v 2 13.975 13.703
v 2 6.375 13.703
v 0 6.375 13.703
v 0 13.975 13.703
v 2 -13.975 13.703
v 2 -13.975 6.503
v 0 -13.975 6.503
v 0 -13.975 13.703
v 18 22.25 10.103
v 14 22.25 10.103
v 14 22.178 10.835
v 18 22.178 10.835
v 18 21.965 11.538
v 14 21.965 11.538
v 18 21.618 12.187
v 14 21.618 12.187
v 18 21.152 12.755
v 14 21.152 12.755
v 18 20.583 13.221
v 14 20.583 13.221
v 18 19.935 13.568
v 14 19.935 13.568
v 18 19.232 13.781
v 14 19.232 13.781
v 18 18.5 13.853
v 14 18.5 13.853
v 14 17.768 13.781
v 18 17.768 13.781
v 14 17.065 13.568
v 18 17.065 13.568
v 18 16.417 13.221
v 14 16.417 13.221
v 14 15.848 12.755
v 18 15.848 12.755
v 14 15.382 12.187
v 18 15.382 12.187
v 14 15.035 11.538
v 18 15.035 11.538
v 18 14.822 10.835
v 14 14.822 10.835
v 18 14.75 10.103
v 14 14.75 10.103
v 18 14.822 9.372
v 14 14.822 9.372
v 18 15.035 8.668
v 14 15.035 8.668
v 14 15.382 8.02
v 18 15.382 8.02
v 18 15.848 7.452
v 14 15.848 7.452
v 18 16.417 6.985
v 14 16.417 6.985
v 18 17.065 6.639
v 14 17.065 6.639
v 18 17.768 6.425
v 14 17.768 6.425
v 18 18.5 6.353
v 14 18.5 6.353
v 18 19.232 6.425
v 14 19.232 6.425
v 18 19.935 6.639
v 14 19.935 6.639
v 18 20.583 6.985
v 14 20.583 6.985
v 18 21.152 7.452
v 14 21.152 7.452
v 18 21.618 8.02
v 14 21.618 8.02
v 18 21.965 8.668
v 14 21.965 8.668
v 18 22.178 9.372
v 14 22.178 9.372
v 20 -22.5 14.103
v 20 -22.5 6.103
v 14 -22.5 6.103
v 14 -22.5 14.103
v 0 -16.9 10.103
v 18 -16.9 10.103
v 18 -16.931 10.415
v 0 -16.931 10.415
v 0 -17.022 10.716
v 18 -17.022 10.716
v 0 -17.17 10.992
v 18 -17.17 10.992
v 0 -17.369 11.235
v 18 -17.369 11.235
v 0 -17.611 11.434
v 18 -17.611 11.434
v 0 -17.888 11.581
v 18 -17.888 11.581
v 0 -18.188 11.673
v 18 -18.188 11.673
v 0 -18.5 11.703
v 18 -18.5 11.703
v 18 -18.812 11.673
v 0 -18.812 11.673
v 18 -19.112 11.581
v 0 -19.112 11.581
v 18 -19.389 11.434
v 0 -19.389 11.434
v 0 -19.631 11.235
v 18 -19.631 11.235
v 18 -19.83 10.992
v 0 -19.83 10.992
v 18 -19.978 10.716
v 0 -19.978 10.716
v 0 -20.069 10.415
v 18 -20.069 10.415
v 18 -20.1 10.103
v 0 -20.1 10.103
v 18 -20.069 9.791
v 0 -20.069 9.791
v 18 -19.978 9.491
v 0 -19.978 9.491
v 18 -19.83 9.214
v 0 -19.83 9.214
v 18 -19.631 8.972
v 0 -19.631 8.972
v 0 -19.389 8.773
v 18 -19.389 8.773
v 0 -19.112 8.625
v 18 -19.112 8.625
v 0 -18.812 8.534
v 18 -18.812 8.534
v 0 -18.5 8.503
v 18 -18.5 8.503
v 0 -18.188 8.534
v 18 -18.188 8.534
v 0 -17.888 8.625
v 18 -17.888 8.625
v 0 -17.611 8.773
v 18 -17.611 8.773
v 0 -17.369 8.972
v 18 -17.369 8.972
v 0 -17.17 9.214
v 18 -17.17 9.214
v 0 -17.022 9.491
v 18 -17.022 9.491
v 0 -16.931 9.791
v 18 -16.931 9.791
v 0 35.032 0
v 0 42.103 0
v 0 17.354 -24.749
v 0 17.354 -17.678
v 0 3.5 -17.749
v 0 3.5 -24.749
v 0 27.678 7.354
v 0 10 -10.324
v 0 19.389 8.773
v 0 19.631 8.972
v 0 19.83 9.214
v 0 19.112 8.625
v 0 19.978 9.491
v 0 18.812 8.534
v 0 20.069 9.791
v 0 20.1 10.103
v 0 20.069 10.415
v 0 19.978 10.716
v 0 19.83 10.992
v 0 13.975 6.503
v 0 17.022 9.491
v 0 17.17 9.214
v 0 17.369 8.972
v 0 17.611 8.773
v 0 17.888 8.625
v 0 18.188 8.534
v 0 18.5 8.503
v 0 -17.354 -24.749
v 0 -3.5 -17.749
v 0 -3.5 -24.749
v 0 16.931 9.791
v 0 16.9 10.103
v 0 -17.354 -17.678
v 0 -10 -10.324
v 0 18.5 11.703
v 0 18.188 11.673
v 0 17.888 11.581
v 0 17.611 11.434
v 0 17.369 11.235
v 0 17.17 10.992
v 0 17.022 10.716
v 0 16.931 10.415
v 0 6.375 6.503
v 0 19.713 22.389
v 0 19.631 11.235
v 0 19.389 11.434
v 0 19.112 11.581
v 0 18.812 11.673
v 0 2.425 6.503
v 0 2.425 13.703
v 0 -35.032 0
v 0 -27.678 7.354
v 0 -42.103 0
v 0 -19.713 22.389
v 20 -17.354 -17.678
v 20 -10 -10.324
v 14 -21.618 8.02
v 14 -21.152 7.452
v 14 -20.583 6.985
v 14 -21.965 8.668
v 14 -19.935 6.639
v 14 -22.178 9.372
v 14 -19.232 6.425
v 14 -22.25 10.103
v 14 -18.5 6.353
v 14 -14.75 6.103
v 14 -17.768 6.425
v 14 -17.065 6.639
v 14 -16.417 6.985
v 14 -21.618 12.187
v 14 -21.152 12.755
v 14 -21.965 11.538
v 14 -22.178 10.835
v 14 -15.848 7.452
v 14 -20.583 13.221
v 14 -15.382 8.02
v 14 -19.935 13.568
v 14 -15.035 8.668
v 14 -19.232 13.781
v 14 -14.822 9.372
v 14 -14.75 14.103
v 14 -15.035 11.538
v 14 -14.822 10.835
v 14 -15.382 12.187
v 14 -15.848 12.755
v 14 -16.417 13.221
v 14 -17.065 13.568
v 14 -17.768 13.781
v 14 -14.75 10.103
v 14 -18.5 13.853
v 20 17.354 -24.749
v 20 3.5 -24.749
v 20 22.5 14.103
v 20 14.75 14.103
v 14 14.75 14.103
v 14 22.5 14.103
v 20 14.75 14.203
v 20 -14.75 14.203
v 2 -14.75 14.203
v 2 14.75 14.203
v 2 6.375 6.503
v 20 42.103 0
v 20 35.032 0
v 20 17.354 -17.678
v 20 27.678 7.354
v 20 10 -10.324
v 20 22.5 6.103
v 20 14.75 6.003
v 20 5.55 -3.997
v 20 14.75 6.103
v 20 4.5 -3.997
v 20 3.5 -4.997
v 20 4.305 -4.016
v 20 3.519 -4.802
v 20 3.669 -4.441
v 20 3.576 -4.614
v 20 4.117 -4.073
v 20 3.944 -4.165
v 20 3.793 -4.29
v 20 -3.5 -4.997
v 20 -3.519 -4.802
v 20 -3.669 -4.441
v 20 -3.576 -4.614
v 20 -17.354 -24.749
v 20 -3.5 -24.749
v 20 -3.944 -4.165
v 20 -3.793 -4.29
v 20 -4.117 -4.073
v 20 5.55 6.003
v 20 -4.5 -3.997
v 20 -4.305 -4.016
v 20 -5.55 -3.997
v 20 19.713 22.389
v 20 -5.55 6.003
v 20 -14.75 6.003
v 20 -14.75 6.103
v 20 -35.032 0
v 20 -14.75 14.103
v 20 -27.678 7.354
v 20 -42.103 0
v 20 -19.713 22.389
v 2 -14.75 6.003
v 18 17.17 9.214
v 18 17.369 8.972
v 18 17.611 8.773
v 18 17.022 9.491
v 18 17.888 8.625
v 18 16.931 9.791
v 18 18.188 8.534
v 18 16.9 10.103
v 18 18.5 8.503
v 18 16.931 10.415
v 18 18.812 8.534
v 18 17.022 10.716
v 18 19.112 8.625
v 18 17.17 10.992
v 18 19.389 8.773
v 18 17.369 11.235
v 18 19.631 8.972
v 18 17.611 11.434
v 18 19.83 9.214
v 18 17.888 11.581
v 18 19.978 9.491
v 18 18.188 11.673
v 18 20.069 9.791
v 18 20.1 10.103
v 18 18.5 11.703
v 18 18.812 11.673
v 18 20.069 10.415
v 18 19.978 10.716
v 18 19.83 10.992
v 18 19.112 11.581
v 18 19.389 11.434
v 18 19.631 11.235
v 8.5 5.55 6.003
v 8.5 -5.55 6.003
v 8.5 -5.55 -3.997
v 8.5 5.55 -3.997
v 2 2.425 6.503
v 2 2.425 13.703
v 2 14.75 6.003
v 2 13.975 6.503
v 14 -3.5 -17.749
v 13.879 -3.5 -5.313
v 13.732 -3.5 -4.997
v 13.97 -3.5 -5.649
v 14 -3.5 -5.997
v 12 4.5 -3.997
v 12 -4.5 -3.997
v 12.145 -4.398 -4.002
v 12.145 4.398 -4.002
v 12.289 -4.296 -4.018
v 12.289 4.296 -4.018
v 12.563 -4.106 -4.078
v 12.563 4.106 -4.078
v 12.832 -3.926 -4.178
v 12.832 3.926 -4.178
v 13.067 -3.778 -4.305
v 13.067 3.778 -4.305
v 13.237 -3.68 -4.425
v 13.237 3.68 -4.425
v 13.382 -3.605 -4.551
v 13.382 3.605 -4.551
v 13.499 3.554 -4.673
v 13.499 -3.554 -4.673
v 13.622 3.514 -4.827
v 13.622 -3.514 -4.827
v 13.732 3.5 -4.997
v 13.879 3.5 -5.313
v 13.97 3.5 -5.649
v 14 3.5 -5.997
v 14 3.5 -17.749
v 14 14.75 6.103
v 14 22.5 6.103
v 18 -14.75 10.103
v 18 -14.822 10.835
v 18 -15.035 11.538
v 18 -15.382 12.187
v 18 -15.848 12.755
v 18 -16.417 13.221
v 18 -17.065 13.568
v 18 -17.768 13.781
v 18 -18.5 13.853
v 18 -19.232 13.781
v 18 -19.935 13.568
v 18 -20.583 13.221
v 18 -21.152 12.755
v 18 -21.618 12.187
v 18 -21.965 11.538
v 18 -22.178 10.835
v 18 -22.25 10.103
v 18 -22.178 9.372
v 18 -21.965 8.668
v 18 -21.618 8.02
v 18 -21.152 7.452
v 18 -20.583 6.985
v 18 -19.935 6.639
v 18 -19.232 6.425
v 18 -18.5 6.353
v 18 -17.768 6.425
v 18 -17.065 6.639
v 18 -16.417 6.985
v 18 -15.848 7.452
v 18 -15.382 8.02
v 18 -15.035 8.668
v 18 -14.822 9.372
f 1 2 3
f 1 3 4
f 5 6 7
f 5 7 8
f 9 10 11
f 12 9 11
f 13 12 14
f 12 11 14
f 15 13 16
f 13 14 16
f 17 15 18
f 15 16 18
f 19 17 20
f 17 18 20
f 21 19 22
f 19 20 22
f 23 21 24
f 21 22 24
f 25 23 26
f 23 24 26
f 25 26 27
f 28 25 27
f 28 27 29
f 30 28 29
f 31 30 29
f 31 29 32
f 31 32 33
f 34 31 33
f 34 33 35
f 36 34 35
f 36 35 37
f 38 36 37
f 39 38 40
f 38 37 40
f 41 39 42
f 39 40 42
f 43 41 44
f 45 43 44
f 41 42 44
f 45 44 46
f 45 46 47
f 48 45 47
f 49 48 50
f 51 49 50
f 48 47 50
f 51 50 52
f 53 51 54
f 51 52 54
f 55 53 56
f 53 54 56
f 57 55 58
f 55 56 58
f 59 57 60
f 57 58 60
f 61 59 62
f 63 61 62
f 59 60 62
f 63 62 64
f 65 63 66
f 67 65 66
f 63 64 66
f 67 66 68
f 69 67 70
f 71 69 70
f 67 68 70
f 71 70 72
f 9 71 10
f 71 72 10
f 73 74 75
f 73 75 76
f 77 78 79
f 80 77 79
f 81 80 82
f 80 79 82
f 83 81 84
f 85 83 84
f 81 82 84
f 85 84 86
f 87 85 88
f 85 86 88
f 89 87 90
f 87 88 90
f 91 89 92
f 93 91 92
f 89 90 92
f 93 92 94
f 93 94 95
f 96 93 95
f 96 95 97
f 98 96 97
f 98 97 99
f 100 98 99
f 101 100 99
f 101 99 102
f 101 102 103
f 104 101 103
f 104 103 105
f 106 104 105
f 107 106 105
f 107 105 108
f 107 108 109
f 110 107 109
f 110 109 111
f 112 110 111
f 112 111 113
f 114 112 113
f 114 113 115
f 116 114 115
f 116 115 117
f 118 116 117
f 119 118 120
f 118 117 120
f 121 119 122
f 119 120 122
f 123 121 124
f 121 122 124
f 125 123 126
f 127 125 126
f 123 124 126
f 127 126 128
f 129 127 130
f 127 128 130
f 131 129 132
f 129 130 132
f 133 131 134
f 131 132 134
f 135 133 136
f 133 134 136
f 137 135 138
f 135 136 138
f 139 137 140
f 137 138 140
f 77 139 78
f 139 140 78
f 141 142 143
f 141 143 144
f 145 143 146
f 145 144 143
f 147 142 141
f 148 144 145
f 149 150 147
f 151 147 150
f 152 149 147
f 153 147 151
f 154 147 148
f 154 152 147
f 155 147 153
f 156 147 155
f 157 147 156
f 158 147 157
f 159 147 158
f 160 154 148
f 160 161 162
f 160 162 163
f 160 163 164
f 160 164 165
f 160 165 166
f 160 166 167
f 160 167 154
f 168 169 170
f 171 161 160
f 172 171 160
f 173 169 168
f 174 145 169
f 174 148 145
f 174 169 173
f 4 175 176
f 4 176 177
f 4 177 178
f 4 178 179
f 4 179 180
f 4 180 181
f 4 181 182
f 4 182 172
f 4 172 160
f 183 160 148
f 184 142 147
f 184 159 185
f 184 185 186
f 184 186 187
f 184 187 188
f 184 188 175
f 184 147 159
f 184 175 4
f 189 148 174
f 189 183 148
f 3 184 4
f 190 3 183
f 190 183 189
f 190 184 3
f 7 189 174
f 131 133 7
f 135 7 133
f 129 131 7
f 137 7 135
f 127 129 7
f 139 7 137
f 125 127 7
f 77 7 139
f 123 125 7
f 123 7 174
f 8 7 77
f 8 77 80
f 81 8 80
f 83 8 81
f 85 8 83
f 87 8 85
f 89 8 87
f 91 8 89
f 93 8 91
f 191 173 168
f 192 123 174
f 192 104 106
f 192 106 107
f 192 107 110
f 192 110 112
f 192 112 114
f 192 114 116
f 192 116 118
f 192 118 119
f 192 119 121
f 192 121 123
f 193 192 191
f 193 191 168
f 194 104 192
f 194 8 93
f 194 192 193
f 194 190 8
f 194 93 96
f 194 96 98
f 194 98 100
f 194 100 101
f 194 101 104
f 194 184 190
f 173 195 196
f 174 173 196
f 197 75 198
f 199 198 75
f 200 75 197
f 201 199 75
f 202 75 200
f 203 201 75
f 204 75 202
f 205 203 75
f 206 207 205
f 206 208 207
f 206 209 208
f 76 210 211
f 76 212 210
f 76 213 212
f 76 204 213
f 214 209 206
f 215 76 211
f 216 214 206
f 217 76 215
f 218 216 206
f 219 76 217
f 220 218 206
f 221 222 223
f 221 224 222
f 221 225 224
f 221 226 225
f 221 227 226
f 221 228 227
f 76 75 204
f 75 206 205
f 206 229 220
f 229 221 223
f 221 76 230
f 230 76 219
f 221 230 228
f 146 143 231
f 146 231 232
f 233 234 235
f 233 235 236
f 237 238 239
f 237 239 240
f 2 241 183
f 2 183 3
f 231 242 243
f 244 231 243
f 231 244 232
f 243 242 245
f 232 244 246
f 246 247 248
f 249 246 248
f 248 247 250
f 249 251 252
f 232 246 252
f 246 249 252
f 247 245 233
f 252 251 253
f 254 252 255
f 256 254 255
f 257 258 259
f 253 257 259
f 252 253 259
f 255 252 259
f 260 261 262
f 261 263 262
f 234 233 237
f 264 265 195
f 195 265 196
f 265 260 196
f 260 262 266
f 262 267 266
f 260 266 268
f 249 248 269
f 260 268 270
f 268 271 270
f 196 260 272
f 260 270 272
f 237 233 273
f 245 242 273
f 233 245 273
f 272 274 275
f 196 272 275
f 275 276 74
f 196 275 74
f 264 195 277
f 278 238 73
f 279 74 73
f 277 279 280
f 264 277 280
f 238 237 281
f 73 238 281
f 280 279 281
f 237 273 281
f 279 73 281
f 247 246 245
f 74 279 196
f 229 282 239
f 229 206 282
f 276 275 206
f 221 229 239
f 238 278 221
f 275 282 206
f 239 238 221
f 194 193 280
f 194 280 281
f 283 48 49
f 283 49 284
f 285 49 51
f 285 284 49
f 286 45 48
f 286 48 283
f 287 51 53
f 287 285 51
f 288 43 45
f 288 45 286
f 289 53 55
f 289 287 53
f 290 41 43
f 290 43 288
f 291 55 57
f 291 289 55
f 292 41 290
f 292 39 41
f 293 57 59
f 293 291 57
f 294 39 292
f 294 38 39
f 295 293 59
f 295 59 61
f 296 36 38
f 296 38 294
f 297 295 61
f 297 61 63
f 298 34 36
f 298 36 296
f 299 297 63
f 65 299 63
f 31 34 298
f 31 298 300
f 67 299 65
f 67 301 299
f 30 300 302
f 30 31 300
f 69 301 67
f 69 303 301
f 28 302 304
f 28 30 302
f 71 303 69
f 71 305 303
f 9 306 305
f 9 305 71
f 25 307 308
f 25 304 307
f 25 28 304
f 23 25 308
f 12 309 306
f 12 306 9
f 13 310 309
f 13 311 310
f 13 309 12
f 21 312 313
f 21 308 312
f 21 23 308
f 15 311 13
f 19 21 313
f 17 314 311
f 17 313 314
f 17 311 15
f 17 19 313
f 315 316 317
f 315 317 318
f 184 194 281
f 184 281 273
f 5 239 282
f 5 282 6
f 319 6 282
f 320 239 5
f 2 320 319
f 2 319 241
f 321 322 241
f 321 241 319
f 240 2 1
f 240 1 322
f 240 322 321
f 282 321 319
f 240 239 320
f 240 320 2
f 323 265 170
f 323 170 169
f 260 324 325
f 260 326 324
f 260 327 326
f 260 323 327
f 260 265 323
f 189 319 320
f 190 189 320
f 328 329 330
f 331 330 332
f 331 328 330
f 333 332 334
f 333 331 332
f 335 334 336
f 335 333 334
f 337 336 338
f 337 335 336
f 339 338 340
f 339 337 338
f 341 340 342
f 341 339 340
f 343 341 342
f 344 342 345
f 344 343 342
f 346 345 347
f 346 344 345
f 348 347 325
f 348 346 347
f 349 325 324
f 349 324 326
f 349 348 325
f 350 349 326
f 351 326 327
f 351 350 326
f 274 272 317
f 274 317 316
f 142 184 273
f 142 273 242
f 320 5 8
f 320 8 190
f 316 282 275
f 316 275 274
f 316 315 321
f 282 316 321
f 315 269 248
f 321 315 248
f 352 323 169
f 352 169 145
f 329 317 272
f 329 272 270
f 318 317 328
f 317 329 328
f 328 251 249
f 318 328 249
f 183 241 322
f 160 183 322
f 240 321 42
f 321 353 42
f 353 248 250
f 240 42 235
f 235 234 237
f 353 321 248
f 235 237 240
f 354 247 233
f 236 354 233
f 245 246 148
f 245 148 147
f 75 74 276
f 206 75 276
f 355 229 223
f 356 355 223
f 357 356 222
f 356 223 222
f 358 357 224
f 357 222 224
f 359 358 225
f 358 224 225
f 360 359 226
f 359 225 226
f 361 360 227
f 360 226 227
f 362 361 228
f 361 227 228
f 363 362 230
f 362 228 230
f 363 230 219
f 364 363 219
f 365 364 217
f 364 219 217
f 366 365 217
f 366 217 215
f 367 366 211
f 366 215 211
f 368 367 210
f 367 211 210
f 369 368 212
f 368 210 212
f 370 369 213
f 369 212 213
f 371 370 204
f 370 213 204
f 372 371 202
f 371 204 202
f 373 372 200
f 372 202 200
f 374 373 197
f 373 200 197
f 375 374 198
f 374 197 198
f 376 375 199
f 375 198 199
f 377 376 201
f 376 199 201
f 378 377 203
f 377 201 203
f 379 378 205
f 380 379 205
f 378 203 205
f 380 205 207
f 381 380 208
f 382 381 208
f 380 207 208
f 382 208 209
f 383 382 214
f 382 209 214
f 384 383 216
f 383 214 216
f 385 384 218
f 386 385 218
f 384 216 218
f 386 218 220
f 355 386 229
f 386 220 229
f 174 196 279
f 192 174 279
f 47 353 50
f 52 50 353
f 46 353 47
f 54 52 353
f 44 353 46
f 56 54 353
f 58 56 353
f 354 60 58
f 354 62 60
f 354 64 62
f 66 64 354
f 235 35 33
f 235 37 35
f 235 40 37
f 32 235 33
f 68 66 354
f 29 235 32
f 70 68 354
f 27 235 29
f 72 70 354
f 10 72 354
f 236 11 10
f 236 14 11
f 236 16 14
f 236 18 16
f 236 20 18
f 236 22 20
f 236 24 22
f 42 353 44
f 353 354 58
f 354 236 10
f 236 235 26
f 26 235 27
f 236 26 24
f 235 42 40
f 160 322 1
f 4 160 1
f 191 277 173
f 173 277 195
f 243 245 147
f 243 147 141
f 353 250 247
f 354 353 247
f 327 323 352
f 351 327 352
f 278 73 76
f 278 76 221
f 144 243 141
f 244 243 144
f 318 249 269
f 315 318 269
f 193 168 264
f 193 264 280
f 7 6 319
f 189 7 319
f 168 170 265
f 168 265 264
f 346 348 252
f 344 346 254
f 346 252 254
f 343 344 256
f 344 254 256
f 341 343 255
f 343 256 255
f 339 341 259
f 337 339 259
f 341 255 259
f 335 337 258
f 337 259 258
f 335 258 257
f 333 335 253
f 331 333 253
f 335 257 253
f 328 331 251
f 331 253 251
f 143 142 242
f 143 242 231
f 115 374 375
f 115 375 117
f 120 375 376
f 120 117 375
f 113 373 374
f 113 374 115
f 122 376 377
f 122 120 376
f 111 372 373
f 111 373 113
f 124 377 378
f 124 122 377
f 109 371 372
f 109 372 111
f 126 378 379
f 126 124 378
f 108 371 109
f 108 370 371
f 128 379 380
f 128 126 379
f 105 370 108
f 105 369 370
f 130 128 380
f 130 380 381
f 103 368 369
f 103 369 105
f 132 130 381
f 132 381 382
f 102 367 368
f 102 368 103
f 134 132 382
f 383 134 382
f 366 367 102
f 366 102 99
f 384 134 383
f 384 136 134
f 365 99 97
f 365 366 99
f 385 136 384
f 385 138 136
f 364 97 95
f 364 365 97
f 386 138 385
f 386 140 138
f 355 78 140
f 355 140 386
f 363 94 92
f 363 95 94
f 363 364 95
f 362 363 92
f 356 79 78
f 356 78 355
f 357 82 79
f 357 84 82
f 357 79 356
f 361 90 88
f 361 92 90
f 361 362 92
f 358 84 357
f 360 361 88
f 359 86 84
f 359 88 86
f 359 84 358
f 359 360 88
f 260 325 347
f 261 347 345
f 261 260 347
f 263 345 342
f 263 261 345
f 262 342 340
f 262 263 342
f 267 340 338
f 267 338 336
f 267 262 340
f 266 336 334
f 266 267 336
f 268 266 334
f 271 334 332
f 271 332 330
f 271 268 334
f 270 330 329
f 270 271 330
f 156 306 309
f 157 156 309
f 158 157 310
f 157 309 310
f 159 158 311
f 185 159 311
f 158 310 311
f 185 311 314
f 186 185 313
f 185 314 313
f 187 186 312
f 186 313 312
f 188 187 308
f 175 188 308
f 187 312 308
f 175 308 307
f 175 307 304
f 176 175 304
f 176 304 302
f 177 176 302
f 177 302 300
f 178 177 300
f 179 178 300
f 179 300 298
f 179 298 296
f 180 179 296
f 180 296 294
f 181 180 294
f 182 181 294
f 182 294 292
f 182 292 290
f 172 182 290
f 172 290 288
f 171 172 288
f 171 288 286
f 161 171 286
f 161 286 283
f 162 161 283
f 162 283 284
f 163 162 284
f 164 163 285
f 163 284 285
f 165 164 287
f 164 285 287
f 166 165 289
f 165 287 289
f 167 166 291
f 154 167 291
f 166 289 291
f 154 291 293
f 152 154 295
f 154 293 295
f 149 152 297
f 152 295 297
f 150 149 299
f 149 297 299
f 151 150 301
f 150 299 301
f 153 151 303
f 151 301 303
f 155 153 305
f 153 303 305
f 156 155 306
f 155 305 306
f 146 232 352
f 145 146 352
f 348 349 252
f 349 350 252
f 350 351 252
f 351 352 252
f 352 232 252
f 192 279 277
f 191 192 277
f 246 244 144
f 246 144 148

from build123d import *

# Parameters (mm, degrees)
PAD_DEPTH       = 20
POCKET_DEPTH    = 20
SKETCH002_W     = 29.5
SKETCH002_H     = 8.2
POCKET001_DEPTH = 18
SKETCH003_W     = 16.4
SKETCH003_H     = 7.2
SKETCH003_W_2   = 7.6
POCKET002_DEPTH = 5
SKETCH004_W     = 11.1
SKETCH004_H     = 10
POCKET003_DEPTH = 11.5
SKETCH005_W     = 7
SKETCH005_H     = 20.7519948728
POCKET004_DEPTH = 6
FILLET_R        = 2
FILLET001_R     = 1
FILLET002_R     = 1
SKETCH007_W     = 7
SKETCH007_H     = 14
POCKET005_DEPTH = 7
SKETCH008_W     = 7.75
SKETCH008_H     = 8
POCKET006_DEPTH = 6
SKETCH009_R     = 3.75
PAD001_DEPTH    = 4
SKETCH010_R     = 1.6
POCKET007_DEPTH = 20
SKETCH011_W     = 7.75
SKETCH011_H     = 8
POCKET008_DEPTH = 6
SKETCH012_R     = 3.75
PAD002_DEPTH    = 4
SKETCH013_R     = 1.6
POCKET009_DEPTH = 20


with BuildPart() as part:
    # Sketch → Pad (new body)
    with BuildSketch(Plane.YZ):
        Polygon((-19.7132034356, 22.3894444303), (19.7132034356, 22.3894444303), (42.1026478659, 0), (17.3539105243, -24.7487373415), (-17.3539105243, -24.7487373415), (-42.1026478659, 0), align=None)
    extrude(amount=PAD_DEPTH)

    # Sketch001 (on Face8 of Pad) → Pocket (cut)
    with BuildSketch(Plane.YZ.offset(20)):
        Polygon((-35.031580054, 0), (-17.3539105243, -17.6776695297), (-10, -10.3237590053), (-27.6776695297, 7.3539105243), align=None)
        Polygon((10, -10.3237590053), (27.6776695297, 7.3539105243), (35.031580054, 0), (17.3539105243, -17.6776695297), align=None)
    extrude(amount=-POCKET_DEPTH, mode=Mode.SUBTRACT)

    # Sketch002 (on Face5 of Pocket) → Pocket001 (cut)
    with BuildSketch(Plane.YZ.offset(20)):
        with Locations((0, 10.1032575313)):
            Rectangle(SKETCH002_W, SKETCH002_H)
    extrude(amount=-POCKET001_DEPTH, mode=Mode.SUBTRACT)

    # Sketch003 (on Face21 of Pocket001) → Pocket002 (cut)
    with BuildSketch(Plane.YZ.offset(2)):
        with Locations((-5.775, 10.1032575313)):
            Rectangle(SKETCH003_W, SKETCH003_H)
        with Locations((10.175, 10.1032575313)):
            Rectangle(SKETCH003_W_2, SKETCH003_H)
    extrude(amount=-POCKET002_DEPTH, mode=Mode.SUBTRACT)

    # Sketch004 (on Face5 of Pocket002) → Pocket003 (cut)
    with BuildSketch(Plane.YZ.offset(20)):
        with Locations((0, 1.0032575313)):
            Rectangle(SKETCH004_W, SKETCH004_H)
    extrude(amount=-POCKET003_DEPTH, mode=Mode.SUBTRACT)

    # Sketch005 (on Face5 of Pocket003) → Pocket004 (cut)
    with BuildSketch(Plane.YZ.offset(20)):
        with Locations((0, -14.3727399051)):
            Rectangle(SKETCH005_W, SKETCH005_H)
    extrude(amount=-POCKET004_DEPTH, mode=Mode.SUBTRACT)

    # Fillet
    fillet_edges = [part.edges().sort_by_distance(p)[0] for p in [
        (14, 0, -3.996742),
    ]]
    fillet(fillet_edges, radius=FILLET_R)

    # Fillet001
    fillet001_edges = [part.edges().sort_by_distance(p)[0] for p in [
        (17, -3.5, -3.996742),
    ]]
    fillet(fillet001_edges, radius=FILLET001_R)

    # Fillet002
    fillet002_edges = [part.edges().sort_by_distance(p)[0] for p in [
        (17, 3.5, -3.996742),
    ]]
    fillet(fillet002_edges, radius=FILLET002_R)

    # Sketch007 (on Face9 of Fillet002) → Pocket005 (cut)
    with BuildSketch(Plane.YX.offset(24.7487373415)):
        with Locations((0, 7)):
            Rectangle(SKETCH007_W, SKETCH007_H)
    extrude(amount=-POCKET005_DEPTH, mode=Mode.SUBTRACT)

    # Sketch008 (on Face11 of Pocket005) → Pocket006 (cut)
    with BuildSketch(Plane.YZ.offset(20)):
        with Locations((-18.625, 10.1032575313)):
            Rectangle(SKETCH008_W, SKETCH008_H)
    extrude(amount=-POCKET006_DEPTH, mode=Mode.SUBTRACT)

    # Sketch009 (on Face49 of Pocket006) → Pad001 (join)
    with BuildSketch(Plane.YZ.offset(14)):
        with Locations((-18.5, 10.1032575313)):
            Circle(SKETCH009_R)
    extrude(amount=PAD001_DEPTH)

    # Sketch010 (on Face51 of Pad001) → Pocket007 (cut)
    with BuildSketch(Plane.YZ.offset(18)):
        with Locations((-18.5, 10.1032575313)):
            Circle(SKETCH010_R)
    extrude(amount=-POCKET007_DEPTH, mode=Mode.SUBTRACT)

    # Sketch011 (on Face11 of Pocket007) → Pocket008 (cut)
    with BuildSketch(Plane.YZ.offset(20)):
        with Locations((18.625, 10.1032575313)):
            Rectangle(SKETCH011_W, SKETCH011_H)
    extrude(amount=-POCKET008_DEPTH, mode=Mode.SUBTRACT)

    # Sketch012 (on Face54 of Pocket008) → Pad002 (join)
    with BuildSketch(Plane.YZ.offset(14)):
        with Locations((18.5, 10.1032575313)):
            Circle(SKETCH012_R)
    extrude(amount=PAD002_DEPTH)

    # Sketch013 (on Face58 of Pad002) → Pocket009 (cut)
    with BuildSketch(Plane.YZ.offset(18)):
        with Locations((18.5, 10.1032575313)):
            Circle(SKETCH013_R)
    extrude(amount=-POCKET009_DEPTH, mode=Mode.SUBTRACT)


solid = part.part
